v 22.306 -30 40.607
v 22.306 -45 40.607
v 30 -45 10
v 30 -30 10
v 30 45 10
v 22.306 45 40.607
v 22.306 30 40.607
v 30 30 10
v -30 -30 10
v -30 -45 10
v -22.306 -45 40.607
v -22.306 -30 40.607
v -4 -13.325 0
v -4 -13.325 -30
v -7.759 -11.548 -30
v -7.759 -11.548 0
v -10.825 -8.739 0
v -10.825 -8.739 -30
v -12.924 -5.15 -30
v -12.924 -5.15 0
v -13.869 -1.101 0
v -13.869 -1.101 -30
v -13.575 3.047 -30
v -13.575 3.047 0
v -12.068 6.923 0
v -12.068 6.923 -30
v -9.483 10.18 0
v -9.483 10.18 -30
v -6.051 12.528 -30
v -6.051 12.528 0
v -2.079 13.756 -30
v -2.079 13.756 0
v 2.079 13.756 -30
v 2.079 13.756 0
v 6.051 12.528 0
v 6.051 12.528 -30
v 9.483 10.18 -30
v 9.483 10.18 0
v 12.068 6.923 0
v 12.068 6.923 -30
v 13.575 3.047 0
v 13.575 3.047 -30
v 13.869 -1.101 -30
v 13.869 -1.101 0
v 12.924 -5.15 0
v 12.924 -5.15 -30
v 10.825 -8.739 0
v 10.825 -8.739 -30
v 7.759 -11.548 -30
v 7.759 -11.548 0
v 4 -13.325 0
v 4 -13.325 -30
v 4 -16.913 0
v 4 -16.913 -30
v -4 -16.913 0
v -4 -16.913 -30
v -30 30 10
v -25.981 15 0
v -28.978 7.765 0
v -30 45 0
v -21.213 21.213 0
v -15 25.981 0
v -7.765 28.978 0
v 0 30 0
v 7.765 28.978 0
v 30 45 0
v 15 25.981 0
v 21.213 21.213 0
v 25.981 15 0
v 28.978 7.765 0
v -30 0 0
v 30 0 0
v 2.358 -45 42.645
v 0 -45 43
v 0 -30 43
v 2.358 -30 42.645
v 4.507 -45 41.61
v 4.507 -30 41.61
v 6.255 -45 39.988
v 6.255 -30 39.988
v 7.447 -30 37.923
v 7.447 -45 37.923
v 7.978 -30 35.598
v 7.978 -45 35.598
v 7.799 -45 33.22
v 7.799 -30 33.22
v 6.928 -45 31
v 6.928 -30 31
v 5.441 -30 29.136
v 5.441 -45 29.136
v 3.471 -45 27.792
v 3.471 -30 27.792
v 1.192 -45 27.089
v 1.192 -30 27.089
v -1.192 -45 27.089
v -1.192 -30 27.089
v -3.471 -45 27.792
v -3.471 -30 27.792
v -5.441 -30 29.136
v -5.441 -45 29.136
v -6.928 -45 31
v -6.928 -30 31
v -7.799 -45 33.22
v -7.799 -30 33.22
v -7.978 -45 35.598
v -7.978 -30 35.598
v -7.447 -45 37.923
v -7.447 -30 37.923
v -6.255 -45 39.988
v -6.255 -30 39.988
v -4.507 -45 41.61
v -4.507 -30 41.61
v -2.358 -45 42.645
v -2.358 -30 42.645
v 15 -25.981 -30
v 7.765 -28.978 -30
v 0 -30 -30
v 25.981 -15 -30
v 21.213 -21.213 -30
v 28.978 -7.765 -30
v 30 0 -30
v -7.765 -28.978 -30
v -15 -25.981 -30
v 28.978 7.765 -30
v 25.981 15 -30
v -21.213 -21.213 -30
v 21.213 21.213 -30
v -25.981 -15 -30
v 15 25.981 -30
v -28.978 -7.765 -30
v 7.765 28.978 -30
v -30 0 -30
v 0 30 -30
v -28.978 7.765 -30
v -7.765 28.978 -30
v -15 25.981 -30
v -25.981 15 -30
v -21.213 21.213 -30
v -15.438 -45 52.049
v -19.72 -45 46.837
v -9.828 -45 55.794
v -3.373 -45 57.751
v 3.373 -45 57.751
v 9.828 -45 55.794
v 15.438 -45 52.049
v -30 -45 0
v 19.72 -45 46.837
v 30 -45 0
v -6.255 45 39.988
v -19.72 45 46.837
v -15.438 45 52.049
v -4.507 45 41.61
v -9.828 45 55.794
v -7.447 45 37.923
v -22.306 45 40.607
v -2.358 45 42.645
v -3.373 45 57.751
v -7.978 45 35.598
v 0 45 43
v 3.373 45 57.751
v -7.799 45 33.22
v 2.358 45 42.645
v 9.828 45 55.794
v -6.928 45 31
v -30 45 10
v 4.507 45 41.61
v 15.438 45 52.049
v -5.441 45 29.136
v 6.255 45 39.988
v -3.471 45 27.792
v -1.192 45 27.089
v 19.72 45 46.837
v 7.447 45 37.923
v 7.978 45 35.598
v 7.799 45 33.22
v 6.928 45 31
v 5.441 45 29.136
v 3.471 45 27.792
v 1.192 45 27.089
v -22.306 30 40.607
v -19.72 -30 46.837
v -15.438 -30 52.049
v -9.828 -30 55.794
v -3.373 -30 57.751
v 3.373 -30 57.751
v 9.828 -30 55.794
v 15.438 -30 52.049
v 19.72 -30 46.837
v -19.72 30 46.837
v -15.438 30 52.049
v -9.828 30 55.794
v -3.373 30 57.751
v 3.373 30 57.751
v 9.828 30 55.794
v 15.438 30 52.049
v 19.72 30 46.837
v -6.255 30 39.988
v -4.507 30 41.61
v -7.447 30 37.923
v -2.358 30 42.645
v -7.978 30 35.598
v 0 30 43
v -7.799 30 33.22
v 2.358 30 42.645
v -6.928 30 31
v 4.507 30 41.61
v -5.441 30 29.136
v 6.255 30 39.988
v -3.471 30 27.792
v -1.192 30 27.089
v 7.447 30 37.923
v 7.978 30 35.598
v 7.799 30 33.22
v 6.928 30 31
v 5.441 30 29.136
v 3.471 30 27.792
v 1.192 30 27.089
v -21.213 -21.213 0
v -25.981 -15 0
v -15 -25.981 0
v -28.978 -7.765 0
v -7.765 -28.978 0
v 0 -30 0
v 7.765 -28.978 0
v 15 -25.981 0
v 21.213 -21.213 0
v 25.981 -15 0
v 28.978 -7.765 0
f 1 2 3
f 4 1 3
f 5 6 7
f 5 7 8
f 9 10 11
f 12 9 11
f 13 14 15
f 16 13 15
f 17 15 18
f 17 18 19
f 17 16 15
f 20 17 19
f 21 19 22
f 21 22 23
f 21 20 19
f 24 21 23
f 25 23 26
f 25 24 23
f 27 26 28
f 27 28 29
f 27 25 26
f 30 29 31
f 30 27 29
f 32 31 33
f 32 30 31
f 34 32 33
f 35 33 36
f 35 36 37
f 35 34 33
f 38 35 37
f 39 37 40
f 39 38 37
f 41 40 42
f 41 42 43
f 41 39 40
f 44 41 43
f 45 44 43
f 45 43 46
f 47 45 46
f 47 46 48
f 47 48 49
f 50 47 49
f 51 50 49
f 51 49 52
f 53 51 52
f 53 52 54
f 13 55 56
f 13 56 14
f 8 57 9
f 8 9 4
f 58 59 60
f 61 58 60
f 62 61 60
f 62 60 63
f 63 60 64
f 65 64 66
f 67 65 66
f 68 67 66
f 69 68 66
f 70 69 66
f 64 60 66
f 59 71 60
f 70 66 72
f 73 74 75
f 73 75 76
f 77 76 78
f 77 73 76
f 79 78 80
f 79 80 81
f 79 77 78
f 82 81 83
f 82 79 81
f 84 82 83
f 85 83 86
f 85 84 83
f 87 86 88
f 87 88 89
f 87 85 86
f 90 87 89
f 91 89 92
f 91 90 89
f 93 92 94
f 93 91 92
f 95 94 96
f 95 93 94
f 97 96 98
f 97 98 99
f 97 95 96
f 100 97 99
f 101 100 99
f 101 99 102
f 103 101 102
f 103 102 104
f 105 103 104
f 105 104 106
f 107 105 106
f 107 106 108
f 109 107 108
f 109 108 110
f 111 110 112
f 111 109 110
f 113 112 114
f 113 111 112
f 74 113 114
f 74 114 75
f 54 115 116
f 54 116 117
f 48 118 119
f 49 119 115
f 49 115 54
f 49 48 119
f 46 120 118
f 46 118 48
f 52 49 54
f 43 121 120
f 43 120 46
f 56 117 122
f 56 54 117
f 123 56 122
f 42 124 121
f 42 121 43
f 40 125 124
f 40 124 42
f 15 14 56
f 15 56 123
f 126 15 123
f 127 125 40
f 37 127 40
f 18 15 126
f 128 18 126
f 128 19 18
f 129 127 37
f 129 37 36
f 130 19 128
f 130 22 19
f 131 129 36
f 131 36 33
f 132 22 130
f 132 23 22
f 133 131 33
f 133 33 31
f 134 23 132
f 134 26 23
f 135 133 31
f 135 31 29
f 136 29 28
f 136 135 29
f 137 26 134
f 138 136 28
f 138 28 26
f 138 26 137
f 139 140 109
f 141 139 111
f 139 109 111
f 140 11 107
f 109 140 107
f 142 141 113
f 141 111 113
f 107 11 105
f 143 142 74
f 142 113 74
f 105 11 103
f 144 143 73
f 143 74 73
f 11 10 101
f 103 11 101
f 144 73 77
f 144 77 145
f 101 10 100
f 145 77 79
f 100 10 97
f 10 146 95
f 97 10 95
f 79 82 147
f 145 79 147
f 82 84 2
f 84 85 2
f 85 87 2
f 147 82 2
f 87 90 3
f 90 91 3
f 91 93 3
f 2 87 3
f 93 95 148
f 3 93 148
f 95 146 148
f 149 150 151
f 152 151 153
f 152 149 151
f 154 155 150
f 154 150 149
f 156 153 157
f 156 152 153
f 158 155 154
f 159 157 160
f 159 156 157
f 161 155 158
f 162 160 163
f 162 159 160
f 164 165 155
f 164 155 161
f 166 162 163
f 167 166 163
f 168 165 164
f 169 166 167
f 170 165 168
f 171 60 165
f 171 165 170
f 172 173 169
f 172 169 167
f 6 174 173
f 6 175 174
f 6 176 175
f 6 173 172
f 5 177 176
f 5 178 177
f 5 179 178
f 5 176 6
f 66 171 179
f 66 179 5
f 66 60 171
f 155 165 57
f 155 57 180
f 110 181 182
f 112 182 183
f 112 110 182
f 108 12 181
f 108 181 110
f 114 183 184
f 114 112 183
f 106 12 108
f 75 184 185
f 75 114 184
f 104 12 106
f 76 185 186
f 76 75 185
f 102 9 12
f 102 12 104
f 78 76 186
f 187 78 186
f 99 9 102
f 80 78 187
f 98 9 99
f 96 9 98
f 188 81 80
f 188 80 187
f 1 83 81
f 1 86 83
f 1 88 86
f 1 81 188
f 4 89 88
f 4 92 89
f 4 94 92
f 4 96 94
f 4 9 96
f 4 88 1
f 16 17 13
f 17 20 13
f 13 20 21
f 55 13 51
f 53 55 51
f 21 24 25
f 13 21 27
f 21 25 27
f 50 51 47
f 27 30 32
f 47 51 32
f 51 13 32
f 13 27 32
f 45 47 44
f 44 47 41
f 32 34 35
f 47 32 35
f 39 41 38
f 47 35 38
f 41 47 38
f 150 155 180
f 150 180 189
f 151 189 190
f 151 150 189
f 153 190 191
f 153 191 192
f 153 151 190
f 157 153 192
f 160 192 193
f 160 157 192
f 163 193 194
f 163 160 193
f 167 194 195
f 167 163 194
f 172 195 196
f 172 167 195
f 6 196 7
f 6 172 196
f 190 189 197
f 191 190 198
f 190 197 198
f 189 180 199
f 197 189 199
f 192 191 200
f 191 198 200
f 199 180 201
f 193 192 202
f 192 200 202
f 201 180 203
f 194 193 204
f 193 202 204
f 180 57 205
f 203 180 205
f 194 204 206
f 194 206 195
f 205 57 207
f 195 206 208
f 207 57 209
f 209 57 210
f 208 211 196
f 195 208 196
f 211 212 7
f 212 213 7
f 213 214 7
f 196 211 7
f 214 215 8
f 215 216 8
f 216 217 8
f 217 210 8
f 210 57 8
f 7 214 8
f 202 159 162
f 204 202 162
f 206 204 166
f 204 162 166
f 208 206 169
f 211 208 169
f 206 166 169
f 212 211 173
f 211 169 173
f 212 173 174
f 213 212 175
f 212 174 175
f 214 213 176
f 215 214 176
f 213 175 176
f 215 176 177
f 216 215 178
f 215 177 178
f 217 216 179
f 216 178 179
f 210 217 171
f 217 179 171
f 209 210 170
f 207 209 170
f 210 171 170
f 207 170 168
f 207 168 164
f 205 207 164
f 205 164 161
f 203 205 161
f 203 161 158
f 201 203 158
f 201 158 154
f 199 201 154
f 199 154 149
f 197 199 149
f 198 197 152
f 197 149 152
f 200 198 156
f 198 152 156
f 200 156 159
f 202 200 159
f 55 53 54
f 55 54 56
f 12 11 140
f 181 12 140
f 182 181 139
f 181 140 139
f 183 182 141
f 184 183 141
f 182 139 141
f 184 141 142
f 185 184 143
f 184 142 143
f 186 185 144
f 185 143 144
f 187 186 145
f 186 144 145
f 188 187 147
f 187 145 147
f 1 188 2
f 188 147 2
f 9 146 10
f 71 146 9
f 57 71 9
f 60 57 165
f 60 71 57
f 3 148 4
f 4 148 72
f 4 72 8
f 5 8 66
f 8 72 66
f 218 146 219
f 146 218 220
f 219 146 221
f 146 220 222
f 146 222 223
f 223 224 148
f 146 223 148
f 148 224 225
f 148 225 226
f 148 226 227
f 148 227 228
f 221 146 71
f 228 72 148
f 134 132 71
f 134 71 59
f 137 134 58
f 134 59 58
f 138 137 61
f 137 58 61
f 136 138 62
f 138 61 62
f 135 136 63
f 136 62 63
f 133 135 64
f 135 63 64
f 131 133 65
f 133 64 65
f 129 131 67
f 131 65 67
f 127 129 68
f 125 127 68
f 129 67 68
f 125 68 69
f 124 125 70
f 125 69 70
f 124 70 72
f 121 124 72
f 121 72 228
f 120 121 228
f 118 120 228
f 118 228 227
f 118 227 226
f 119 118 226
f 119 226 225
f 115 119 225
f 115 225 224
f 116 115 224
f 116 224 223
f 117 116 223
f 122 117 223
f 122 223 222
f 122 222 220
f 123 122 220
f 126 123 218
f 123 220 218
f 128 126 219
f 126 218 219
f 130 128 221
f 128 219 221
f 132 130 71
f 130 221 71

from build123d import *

# Parameters (mm, degrees)
SKETCH1_W           = 60
SKETCH1_H           = 90
BOSS_EXTRUDE1_DEPTH = 10
SKETCH2_R           = 30
BOSS_EXTRUDE2_DEPTH = 30
SKETCH6_R           = 8
BOSS_EXTRUDE3_DEPTH = 15


with BuildPart() as part:
    # Sketch1 → Boss-Extrude1 (new body)
    with BuildSketch(Plane.XY):
        Rectangle(SKETCH1_W, SKETCH1_H)
    extrude(amount=BOSS_EXTRUDE1_DEPTH)

    # Sketch2 → Boss-Extrude2 (add)
    with BuildSketch(Plane(origin=(0, 0, 0), x_dir=(-1, 0, 0), z_dir=(0, 0, -1))):
        Circle(SKETCH2_R)
        with BuildLine():
            Line((4, -13.912685387), (4, -13.325269778))
            ThreePointArc((4, -13.325269778), (0, 13.912685387), (-4, -13.325269778))
            Line((-4, -13.325269778), (-4, -13.912685387))
            Line((-4, -13.912685387), (-4, -16.912685387))
            Line((-4, -16.912685387), (4, -16.912685387))
            Line((4, -16.912685387), (4, -13.912685387))
        make_face(mode=Mode.SUBTRACT)
    extrude(amount=BOSS_EXTRUDE2_DEPTH)

    # Sketch6 → Boss-Extrude3 (add)
    with BuildSketch(Plane(origin=(0, 45, 0), x_dir=(1, 0, 0), z_dir=(0, 1, 0))):
        with BuildLine():
            Line((-30, -10), (-22.306028796, -40.607234555))
            ThreePointArc((-22.306028796, -40.607234555), (0, -58), (22.306028796, -40.607234555))
            Line((22.306028796, -40.607234555), (30, -10))
            Line((30, -10), (-30, -10))
        make_face()
        with Locations(Location((0, -35, 0), (0, 0, 270))):
            Circle(SKETCH6_R, mode=Mode.SUBTRACT)
    boss_extrude3 = extrude(amount=-BOSS_EXTRUDE3_DEPTH)

    # Mirror1: Boss-Extrude3 across plane
    add(boss_extrude3.mirror(Plane.ZX))


solid = part.part
